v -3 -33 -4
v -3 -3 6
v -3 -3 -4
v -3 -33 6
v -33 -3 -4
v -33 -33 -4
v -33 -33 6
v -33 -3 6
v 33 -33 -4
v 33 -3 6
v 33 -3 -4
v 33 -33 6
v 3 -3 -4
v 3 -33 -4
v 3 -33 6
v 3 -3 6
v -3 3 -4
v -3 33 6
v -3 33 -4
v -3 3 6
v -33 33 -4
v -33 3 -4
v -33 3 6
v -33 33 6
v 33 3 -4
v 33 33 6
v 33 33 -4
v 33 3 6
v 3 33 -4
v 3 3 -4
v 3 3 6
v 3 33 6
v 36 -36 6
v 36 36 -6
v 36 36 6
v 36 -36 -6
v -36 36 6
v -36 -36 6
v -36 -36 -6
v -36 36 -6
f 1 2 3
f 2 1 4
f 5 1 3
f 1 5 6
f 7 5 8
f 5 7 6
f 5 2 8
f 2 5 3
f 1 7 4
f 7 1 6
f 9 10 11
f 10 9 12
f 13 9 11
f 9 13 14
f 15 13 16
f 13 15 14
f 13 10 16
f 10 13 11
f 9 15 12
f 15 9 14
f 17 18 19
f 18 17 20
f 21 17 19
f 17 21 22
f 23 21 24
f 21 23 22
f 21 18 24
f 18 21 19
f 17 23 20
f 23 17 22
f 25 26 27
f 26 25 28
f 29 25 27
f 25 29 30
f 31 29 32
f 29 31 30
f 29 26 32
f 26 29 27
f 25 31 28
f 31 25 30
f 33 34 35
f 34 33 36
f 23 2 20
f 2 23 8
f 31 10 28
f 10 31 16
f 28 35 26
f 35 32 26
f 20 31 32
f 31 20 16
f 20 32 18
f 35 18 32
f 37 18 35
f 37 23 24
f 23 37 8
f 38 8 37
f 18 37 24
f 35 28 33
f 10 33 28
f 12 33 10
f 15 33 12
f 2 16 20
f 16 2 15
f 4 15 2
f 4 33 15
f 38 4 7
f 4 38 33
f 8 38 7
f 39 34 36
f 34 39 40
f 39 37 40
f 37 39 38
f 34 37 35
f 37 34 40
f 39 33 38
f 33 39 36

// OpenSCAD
$fn = 32;

// ----------------------------------------------------------------------
// Pocket plate 72 x 72 x 12
// 2 x 2 pockets 30 mm square, 10 mm deep
// ----------------------------------------------------------------------

// --- parameters (mm) ---
thickness = 12;  // plate thickness
floor_t = 2;     // material left under each pocket
pocket = 30;     // pocket side length
pitch_x = 36;    // pocket pitch along X
pitch_y = 36;    // pocket pitch along Y
cols = 2;        // pockets per row
rows = 2;        // rows of pockets

// --- derived feature positions (mm) ---
depth = thickness - floor_t;        // = 10   pocket depth, down to the floor
span_x = (cols - 1) * pitch_x;      // = 36   distance between outer pockets
span_y = (rows - 1) * pitch_y;      // = 36   distance between outer pocket rows
origin_x = -span_x / 2;             // = -18   X of the first pocket
origin_y = -span_y / 2;             // = -18   Y of the first pocket
plate = [span_x + pocket + 6, span_y + pocket + 6, thickness];  // = [72, 72, 12]   overall size: pockets plus 3 mm of wall on each side
feature_centers = [
  [origin_x + 0 * pitch_x, origin_y + 0 * pitch_y],
  [origin_x + 1 * pitch_x, origin_y + 0 * pitch_y],
  [origin_x + 0 * pitch_x, origin_y + 1 * pitch_y],
  [origin_x + 1 * pitch_x, origin_y + 1 * pitch_y]
];   // pocket centres, used verbatim by the cutter loop

// plate outline, then one pocket per centre in feature_centers
difference() {
  cube(plate, center = true);
  for (centre = feature_centers)
    translate([centre[0] - pocket / 2, centre[1] - pocket / 2, plate[2] / 2 - depth])
      cube([pocket, pocket, depth + 1]);  // centred on the declared pocket centre
}
